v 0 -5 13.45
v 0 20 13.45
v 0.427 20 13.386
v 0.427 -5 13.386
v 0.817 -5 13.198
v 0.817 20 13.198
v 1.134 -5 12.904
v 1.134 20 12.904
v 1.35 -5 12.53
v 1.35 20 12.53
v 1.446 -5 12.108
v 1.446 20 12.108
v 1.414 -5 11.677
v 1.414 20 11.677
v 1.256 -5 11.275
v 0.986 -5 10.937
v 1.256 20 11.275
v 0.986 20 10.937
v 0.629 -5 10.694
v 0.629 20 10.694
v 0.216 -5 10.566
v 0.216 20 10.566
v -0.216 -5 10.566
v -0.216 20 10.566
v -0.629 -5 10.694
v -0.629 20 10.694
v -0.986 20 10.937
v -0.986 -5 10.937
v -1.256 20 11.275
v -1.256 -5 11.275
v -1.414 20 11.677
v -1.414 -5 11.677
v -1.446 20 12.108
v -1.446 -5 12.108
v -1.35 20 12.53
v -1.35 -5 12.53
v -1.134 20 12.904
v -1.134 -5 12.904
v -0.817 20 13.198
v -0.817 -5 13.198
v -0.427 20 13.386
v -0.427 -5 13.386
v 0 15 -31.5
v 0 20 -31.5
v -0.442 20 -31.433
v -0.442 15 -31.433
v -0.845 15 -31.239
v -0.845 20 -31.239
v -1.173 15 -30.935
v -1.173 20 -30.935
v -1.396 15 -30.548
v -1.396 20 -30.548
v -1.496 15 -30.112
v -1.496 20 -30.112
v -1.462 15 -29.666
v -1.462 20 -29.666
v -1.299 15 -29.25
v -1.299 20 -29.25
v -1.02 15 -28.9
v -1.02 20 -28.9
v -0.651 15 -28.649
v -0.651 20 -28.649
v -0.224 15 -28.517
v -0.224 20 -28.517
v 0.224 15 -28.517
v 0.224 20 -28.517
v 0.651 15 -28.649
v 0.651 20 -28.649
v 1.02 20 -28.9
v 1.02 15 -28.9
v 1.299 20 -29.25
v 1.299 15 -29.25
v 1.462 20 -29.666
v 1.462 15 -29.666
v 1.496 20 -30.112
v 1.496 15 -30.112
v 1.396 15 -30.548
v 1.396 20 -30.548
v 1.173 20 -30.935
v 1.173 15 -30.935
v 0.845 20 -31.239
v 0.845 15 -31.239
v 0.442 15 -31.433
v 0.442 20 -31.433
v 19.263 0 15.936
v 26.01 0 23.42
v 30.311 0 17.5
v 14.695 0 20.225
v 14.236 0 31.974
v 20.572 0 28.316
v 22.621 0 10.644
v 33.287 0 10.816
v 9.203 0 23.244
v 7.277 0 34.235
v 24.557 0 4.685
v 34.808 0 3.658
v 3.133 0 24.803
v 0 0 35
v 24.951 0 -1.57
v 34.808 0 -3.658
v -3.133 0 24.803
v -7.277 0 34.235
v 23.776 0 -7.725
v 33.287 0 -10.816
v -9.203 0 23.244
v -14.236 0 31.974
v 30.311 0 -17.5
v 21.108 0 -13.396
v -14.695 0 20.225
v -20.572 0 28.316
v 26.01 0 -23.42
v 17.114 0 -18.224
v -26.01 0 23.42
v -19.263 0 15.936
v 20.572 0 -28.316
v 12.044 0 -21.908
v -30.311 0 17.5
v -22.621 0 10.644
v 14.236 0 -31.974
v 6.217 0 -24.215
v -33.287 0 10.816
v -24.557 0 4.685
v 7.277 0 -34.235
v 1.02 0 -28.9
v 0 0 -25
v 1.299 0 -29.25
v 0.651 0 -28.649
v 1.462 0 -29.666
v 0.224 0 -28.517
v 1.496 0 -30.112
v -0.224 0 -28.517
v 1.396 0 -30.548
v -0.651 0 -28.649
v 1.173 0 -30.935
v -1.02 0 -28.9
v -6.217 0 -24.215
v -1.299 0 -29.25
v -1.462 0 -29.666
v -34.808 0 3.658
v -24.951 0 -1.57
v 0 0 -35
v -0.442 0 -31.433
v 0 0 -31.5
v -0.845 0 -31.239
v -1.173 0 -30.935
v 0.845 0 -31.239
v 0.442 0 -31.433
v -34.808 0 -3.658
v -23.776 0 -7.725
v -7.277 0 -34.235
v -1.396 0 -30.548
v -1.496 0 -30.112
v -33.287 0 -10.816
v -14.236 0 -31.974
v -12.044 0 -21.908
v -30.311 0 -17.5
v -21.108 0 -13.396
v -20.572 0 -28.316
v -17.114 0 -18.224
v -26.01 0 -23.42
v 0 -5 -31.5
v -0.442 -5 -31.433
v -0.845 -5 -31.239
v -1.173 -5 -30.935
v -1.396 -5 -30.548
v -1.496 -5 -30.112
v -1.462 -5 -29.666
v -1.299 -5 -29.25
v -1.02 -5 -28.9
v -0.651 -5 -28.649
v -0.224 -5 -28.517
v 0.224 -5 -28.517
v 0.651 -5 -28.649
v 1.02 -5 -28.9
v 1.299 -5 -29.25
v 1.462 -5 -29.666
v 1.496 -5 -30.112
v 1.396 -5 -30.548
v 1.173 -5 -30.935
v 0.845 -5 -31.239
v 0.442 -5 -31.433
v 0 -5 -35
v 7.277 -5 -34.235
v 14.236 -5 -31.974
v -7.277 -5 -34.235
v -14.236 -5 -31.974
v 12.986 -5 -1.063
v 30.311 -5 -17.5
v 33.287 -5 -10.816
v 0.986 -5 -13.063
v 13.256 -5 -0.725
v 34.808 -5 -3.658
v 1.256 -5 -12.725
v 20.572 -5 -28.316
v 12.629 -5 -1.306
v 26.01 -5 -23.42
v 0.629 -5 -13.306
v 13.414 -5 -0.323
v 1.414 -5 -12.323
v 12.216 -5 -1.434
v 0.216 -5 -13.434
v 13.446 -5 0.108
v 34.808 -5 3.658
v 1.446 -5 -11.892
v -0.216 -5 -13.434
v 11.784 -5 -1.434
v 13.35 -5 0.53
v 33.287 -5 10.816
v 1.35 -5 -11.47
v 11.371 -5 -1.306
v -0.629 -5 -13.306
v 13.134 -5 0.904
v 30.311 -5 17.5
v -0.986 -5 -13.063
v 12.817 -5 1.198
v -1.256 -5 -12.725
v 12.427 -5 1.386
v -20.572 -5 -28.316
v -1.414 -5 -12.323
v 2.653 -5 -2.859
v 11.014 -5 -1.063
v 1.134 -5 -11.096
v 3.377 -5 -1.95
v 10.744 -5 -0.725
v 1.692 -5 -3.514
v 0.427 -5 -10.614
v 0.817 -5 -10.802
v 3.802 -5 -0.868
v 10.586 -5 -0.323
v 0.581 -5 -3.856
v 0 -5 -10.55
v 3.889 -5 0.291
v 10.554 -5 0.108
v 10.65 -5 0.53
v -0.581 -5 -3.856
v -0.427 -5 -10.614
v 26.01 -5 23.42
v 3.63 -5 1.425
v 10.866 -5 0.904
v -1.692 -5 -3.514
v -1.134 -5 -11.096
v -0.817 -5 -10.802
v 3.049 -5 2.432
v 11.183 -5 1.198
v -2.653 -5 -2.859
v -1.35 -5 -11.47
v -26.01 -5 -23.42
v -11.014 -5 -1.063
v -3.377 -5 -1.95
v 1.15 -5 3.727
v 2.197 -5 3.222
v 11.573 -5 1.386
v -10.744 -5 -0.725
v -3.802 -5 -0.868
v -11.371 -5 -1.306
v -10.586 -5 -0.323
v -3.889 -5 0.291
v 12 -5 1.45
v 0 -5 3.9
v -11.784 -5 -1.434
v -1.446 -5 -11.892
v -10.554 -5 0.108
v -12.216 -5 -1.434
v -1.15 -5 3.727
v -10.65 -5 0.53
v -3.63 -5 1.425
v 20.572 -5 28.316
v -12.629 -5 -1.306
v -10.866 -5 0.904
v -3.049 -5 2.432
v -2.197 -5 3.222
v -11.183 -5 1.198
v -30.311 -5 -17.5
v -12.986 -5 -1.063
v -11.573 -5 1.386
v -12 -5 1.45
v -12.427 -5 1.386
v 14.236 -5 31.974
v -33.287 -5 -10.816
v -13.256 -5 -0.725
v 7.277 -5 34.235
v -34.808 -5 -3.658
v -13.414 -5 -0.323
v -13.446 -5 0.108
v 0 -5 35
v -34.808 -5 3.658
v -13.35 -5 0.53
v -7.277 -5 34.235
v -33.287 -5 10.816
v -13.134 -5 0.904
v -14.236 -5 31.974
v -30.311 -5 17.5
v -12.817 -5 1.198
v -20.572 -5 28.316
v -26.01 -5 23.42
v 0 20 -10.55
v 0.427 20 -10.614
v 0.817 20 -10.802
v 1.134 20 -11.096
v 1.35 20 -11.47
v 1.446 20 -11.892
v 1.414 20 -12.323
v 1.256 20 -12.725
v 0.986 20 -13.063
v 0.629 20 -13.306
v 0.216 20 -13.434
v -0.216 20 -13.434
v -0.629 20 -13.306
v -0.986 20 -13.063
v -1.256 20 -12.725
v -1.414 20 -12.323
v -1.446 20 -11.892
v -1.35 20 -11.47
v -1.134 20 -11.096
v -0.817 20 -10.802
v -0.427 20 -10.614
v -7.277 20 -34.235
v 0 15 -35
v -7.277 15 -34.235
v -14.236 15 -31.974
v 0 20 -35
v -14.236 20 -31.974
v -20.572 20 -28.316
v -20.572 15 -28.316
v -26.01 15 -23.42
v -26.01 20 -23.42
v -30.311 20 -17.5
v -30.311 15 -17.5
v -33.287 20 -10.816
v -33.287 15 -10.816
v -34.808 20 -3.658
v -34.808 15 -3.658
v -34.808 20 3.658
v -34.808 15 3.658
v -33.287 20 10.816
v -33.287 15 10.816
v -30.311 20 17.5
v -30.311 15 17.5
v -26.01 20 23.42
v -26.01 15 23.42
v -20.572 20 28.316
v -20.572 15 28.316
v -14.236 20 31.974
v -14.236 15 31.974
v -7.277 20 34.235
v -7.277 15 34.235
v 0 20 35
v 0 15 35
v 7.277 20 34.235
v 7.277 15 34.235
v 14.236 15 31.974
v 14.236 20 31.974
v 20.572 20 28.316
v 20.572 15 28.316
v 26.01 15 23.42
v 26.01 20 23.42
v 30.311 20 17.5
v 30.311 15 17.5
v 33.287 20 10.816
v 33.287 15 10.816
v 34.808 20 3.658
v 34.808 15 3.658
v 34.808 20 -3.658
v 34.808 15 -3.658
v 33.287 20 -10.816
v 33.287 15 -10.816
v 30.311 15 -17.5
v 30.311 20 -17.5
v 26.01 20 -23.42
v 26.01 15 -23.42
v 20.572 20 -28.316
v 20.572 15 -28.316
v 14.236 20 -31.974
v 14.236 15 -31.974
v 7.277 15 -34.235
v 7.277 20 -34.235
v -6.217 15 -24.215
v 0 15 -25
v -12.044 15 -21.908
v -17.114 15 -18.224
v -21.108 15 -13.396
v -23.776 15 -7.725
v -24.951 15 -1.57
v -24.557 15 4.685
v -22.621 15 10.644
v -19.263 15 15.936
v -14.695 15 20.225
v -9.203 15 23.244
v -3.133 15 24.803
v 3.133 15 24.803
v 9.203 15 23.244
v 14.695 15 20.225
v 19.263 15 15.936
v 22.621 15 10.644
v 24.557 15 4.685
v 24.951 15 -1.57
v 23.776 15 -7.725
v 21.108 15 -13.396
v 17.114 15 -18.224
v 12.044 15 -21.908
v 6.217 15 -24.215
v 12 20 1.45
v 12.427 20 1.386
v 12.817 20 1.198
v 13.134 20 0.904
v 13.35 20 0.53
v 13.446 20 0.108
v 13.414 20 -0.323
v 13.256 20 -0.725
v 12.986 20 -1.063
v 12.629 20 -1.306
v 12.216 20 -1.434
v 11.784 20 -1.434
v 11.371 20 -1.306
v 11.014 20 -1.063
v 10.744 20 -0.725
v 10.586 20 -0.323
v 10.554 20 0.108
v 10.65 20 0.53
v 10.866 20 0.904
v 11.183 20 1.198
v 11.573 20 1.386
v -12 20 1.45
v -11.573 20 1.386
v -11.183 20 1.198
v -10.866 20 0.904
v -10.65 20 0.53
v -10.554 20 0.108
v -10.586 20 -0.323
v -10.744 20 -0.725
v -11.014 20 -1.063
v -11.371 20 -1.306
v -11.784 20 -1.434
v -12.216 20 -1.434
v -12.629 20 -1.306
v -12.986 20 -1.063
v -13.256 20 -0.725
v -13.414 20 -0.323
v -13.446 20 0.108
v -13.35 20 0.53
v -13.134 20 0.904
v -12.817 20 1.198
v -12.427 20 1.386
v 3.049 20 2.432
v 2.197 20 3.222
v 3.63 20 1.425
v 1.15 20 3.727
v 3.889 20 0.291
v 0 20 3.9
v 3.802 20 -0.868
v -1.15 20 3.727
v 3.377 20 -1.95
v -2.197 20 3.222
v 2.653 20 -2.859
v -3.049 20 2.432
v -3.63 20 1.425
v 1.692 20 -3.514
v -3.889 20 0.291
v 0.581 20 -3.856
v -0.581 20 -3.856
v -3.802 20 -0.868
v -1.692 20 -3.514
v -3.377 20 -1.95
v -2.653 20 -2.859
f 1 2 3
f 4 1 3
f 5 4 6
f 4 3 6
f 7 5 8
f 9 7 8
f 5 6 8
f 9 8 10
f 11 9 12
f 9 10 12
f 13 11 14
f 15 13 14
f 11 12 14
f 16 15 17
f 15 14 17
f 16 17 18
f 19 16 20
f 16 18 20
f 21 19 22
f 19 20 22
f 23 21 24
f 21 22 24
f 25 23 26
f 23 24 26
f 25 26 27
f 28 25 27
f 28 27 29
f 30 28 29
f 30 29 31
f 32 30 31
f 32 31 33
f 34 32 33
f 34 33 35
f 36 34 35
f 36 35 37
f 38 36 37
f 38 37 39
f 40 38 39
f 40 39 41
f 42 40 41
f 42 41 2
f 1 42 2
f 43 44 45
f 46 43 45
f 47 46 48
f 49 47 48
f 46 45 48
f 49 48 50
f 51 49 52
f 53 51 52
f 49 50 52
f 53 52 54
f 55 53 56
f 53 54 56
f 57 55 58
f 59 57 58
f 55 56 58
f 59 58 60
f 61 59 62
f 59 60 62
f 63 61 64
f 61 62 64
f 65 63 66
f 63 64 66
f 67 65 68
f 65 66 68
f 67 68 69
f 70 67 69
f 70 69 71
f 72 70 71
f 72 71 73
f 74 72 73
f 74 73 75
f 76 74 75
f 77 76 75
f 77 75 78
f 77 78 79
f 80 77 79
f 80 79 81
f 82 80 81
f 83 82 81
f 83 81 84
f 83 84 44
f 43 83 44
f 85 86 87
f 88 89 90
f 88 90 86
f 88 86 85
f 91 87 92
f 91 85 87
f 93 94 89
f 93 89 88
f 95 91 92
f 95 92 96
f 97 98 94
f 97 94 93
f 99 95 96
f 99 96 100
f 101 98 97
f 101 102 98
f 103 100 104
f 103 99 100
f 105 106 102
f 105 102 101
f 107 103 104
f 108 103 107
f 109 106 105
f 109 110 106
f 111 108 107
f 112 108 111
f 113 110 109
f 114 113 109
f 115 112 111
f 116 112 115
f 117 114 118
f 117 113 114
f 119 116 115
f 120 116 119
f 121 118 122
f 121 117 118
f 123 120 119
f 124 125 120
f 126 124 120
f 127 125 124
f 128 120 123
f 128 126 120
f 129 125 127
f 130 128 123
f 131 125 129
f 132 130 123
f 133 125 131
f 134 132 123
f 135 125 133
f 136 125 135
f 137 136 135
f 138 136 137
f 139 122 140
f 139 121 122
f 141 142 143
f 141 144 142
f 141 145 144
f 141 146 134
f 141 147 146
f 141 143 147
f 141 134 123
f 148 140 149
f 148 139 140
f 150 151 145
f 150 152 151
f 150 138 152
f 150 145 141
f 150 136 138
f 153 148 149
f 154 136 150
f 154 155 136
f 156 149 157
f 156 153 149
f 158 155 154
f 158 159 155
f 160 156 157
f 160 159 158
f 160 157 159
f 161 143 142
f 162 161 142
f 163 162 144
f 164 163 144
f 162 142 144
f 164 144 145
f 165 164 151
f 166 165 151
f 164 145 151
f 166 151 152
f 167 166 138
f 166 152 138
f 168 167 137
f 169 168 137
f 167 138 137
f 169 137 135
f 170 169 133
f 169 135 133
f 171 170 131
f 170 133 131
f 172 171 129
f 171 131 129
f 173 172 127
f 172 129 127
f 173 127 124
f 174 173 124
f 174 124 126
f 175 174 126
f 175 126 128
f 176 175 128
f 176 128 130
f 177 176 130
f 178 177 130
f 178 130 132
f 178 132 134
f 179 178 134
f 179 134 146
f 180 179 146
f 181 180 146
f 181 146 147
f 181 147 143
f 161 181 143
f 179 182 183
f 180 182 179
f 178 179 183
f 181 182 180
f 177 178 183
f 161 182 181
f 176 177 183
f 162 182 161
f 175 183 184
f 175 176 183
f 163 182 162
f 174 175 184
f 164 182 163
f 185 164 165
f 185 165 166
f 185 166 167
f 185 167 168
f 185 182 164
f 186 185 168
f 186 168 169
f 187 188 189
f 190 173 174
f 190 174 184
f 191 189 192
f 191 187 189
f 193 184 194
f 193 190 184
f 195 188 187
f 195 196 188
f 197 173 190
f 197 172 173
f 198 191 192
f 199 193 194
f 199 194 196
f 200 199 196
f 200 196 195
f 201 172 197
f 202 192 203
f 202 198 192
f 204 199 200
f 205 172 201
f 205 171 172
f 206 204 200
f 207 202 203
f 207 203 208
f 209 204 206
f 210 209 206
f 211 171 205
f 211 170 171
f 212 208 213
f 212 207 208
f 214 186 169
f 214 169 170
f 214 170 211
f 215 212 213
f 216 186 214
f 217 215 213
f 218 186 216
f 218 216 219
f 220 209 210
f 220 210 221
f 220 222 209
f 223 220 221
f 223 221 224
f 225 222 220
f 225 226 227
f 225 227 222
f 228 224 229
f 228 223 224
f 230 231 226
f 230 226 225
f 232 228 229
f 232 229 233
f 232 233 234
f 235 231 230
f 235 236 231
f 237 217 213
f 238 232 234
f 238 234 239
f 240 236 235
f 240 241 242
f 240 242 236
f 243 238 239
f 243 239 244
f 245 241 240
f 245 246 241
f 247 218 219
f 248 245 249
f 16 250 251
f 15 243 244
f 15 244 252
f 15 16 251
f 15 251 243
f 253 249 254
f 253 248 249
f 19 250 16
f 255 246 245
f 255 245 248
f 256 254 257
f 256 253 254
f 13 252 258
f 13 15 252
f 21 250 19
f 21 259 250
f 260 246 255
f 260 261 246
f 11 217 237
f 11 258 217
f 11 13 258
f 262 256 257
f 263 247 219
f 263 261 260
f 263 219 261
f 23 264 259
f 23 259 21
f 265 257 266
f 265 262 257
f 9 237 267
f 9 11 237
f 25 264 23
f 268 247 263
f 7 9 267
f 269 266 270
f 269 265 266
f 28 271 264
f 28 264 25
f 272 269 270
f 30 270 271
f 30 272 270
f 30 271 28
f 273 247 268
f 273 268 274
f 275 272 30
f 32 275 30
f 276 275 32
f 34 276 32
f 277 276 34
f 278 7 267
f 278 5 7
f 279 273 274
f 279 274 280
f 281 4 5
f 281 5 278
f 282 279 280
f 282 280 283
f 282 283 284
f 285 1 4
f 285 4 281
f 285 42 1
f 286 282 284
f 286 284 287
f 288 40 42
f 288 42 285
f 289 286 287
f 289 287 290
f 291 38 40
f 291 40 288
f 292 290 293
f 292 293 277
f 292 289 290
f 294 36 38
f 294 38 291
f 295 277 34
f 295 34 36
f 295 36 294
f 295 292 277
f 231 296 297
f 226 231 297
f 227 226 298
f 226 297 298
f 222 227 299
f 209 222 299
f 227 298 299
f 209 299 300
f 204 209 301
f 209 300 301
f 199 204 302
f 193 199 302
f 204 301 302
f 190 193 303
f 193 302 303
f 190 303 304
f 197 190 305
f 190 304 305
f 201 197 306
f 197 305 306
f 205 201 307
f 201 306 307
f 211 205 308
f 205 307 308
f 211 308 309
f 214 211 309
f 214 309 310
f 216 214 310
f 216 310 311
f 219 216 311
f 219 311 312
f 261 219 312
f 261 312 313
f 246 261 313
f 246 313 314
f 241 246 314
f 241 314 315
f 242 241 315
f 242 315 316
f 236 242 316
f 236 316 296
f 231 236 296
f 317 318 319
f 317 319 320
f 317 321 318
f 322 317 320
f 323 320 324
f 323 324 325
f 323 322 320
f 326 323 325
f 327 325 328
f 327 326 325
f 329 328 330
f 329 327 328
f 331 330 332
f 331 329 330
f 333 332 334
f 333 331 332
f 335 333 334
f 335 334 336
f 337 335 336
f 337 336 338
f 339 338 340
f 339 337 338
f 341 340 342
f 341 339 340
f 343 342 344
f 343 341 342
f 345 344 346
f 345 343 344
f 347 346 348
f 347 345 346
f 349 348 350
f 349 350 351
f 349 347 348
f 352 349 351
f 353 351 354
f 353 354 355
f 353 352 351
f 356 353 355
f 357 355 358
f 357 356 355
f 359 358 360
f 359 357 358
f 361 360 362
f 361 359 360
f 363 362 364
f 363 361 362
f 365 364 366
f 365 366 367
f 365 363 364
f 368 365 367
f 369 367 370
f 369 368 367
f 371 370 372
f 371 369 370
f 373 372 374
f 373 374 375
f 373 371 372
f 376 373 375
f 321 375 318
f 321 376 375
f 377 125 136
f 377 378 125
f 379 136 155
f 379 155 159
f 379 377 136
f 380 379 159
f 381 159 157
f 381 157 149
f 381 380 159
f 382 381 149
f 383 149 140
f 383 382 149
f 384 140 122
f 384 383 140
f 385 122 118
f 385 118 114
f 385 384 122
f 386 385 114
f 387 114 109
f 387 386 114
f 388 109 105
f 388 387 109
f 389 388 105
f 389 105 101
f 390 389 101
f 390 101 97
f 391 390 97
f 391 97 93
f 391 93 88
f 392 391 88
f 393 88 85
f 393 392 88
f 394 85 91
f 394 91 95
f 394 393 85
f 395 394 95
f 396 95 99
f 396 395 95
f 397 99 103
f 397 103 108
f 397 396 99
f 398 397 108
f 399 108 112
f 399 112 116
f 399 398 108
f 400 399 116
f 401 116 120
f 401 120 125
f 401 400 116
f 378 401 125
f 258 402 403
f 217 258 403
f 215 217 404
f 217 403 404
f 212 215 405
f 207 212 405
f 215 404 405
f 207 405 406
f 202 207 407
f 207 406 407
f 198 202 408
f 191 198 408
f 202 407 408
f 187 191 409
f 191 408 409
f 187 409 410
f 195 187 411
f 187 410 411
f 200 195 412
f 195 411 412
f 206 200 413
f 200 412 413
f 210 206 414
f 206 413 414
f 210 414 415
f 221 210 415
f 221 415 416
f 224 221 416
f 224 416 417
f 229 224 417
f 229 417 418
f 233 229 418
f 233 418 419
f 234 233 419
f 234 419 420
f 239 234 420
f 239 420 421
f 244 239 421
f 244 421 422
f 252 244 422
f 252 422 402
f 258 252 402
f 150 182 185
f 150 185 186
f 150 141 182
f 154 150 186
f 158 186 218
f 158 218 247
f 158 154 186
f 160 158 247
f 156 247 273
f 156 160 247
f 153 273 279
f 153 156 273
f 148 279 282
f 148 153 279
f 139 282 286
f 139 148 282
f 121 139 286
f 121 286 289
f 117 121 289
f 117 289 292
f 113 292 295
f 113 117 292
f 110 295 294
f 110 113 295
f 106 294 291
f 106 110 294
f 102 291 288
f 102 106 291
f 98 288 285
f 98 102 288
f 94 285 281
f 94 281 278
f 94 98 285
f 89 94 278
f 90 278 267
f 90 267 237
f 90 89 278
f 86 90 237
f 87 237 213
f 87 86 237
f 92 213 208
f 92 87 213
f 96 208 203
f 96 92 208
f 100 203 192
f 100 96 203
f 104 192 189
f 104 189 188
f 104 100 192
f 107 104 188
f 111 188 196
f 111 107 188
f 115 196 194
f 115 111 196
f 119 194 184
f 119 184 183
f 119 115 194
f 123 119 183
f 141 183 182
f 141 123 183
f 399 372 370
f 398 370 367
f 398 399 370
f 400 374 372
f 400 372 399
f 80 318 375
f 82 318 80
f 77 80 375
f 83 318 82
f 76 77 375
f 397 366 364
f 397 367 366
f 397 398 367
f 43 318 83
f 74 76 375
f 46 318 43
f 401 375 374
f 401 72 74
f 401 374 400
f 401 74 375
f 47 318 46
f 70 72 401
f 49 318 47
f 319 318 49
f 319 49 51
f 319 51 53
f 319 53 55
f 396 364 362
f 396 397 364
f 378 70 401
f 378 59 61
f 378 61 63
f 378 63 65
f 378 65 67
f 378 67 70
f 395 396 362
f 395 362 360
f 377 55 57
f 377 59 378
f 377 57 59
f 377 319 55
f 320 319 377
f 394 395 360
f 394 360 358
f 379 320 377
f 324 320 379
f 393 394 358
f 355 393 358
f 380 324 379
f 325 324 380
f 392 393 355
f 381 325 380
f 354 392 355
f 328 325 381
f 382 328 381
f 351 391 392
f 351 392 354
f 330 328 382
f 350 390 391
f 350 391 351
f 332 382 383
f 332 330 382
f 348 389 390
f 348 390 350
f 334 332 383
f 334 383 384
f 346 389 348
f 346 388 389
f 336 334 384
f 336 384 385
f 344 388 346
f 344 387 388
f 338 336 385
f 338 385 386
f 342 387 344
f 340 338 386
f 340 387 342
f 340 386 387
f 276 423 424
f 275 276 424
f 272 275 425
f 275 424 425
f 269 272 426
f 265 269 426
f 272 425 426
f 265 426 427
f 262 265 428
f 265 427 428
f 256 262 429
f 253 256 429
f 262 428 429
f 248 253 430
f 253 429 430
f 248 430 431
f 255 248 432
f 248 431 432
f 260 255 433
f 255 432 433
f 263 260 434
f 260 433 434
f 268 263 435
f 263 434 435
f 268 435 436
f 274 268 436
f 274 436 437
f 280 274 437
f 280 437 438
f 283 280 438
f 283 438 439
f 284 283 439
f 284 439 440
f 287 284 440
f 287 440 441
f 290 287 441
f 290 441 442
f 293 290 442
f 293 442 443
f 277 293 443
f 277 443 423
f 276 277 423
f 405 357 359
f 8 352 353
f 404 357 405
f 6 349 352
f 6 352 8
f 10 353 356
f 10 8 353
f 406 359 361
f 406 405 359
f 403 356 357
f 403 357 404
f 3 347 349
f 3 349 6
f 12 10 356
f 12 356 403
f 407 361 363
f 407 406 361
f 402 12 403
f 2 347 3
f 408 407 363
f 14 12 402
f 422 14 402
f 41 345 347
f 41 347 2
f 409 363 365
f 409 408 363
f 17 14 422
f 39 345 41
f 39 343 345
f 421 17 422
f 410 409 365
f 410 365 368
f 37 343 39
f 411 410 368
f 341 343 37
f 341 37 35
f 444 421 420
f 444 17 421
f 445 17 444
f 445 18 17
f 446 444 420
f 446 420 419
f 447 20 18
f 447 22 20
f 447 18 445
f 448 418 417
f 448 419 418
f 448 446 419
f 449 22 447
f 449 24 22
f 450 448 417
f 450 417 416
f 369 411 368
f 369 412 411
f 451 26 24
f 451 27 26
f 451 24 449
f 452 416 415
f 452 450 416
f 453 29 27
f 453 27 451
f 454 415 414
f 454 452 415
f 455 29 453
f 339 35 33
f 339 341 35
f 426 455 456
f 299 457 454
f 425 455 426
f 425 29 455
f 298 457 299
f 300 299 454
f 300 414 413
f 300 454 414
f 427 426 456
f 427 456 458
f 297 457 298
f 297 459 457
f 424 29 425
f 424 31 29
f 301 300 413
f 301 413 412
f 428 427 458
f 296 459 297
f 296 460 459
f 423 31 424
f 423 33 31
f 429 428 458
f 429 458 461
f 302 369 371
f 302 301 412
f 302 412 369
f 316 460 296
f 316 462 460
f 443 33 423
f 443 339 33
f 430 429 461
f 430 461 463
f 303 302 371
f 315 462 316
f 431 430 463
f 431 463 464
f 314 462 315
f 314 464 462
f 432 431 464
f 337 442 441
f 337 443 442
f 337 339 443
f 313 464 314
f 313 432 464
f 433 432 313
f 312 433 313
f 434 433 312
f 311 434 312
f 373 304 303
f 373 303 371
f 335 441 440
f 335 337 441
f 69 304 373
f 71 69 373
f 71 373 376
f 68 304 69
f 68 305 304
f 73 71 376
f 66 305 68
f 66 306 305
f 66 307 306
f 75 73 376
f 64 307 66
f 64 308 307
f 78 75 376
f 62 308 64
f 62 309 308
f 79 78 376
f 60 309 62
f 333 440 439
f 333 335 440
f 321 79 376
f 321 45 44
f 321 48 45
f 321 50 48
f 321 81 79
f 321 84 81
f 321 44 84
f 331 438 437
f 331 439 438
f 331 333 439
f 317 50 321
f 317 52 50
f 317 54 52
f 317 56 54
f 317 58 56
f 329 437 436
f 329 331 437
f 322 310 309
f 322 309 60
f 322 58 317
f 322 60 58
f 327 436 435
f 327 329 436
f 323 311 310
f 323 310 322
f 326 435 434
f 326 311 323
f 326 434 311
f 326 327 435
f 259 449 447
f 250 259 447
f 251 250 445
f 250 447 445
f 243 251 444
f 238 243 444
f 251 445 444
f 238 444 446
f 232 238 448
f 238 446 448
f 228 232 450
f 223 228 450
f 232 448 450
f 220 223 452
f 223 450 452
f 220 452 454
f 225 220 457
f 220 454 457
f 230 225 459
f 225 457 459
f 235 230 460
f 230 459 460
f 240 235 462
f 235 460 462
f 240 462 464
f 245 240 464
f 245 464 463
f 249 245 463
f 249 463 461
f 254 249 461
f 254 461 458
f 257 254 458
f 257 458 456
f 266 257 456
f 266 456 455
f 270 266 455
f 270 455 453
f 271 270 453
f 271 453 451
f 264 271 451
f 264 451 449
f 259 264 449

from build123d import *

# Parameters (mm, degrees)
SKETCH1_W          = 25
SKETCH1_H          = 15
SKETCH2_R          = 3.9
SKETCH2_R_2        = 1.45
CUT_EXTRUDE1_DEPTH = 53
SKETCH3_R          = 1.5
CUT_EXTRUDE2_DEPTH = 53


with BuildPart() as part:
    # Sketch1 → Revolve1 (revolve)
    with BuildSketch(Plane(origin=(0, 0, 0), x_dir=(0, 0, -1), z_dir=(1, 0, 0))):
        Polygon((0, 20), (0, 15), (25, 15), (35, 15), (35, 20), align=None)
        with Locations((12.5, 7.5)):
            Rectangle(SKETCH1_W, SKETCH1_H)
        Polygon((25, 0), (0, 0), (0, -5), (35, -5), (35, 0), align=None)
    revolve(axis=Axis((0, 0, 0), (0, 1, 0)))

    # Sketch2 → Cut-Extrude1 (cut)
    with BuildSketch(Plane(origin=(0, 20, 0), x_dir=(1, 0, 0), z_dir=(0, 1, 0))):
        with Locations(Location((0, 0, 0), (0, 0, 270))):
            Circle(SKETCH2_R)
        with Locations(Location((0, 12, 0), (0, 0, 270))):
            Circle(SKETCH2_R_2)
        with Locations(Location((12, 0, 0), (0, 0, 270))):
            Circle(SKETCH2_R_2)
        with Locations(Location((0, -12, 0), (0, 0, 270))):
            Circle(SKETCH2_R_2)
        with Locations(Location((-12, 0, 0), (0, 0, 270))):
            Circle(SKETCH2_R_2)
    extrude(amount=-CUT_EXTRUDE1_DEPTH, mode=Mode.SUBTRACT)

    # Sketch3 → Cut-Extrude2 (cut)
    with BuildSketch(Plane(origin=(0, 20, 0), x_dir=(1, 0, 0), z_dir=(0, 1, 0))):
        with Locations(Location((0, 30, 0), (0, 0, 90))):
            Circle(SKETCH3_R)
    extrude(amount=-CUT_EXTRUDE2_DEPTH, mode=Mode.SUBTRACT)


solid = part.part
